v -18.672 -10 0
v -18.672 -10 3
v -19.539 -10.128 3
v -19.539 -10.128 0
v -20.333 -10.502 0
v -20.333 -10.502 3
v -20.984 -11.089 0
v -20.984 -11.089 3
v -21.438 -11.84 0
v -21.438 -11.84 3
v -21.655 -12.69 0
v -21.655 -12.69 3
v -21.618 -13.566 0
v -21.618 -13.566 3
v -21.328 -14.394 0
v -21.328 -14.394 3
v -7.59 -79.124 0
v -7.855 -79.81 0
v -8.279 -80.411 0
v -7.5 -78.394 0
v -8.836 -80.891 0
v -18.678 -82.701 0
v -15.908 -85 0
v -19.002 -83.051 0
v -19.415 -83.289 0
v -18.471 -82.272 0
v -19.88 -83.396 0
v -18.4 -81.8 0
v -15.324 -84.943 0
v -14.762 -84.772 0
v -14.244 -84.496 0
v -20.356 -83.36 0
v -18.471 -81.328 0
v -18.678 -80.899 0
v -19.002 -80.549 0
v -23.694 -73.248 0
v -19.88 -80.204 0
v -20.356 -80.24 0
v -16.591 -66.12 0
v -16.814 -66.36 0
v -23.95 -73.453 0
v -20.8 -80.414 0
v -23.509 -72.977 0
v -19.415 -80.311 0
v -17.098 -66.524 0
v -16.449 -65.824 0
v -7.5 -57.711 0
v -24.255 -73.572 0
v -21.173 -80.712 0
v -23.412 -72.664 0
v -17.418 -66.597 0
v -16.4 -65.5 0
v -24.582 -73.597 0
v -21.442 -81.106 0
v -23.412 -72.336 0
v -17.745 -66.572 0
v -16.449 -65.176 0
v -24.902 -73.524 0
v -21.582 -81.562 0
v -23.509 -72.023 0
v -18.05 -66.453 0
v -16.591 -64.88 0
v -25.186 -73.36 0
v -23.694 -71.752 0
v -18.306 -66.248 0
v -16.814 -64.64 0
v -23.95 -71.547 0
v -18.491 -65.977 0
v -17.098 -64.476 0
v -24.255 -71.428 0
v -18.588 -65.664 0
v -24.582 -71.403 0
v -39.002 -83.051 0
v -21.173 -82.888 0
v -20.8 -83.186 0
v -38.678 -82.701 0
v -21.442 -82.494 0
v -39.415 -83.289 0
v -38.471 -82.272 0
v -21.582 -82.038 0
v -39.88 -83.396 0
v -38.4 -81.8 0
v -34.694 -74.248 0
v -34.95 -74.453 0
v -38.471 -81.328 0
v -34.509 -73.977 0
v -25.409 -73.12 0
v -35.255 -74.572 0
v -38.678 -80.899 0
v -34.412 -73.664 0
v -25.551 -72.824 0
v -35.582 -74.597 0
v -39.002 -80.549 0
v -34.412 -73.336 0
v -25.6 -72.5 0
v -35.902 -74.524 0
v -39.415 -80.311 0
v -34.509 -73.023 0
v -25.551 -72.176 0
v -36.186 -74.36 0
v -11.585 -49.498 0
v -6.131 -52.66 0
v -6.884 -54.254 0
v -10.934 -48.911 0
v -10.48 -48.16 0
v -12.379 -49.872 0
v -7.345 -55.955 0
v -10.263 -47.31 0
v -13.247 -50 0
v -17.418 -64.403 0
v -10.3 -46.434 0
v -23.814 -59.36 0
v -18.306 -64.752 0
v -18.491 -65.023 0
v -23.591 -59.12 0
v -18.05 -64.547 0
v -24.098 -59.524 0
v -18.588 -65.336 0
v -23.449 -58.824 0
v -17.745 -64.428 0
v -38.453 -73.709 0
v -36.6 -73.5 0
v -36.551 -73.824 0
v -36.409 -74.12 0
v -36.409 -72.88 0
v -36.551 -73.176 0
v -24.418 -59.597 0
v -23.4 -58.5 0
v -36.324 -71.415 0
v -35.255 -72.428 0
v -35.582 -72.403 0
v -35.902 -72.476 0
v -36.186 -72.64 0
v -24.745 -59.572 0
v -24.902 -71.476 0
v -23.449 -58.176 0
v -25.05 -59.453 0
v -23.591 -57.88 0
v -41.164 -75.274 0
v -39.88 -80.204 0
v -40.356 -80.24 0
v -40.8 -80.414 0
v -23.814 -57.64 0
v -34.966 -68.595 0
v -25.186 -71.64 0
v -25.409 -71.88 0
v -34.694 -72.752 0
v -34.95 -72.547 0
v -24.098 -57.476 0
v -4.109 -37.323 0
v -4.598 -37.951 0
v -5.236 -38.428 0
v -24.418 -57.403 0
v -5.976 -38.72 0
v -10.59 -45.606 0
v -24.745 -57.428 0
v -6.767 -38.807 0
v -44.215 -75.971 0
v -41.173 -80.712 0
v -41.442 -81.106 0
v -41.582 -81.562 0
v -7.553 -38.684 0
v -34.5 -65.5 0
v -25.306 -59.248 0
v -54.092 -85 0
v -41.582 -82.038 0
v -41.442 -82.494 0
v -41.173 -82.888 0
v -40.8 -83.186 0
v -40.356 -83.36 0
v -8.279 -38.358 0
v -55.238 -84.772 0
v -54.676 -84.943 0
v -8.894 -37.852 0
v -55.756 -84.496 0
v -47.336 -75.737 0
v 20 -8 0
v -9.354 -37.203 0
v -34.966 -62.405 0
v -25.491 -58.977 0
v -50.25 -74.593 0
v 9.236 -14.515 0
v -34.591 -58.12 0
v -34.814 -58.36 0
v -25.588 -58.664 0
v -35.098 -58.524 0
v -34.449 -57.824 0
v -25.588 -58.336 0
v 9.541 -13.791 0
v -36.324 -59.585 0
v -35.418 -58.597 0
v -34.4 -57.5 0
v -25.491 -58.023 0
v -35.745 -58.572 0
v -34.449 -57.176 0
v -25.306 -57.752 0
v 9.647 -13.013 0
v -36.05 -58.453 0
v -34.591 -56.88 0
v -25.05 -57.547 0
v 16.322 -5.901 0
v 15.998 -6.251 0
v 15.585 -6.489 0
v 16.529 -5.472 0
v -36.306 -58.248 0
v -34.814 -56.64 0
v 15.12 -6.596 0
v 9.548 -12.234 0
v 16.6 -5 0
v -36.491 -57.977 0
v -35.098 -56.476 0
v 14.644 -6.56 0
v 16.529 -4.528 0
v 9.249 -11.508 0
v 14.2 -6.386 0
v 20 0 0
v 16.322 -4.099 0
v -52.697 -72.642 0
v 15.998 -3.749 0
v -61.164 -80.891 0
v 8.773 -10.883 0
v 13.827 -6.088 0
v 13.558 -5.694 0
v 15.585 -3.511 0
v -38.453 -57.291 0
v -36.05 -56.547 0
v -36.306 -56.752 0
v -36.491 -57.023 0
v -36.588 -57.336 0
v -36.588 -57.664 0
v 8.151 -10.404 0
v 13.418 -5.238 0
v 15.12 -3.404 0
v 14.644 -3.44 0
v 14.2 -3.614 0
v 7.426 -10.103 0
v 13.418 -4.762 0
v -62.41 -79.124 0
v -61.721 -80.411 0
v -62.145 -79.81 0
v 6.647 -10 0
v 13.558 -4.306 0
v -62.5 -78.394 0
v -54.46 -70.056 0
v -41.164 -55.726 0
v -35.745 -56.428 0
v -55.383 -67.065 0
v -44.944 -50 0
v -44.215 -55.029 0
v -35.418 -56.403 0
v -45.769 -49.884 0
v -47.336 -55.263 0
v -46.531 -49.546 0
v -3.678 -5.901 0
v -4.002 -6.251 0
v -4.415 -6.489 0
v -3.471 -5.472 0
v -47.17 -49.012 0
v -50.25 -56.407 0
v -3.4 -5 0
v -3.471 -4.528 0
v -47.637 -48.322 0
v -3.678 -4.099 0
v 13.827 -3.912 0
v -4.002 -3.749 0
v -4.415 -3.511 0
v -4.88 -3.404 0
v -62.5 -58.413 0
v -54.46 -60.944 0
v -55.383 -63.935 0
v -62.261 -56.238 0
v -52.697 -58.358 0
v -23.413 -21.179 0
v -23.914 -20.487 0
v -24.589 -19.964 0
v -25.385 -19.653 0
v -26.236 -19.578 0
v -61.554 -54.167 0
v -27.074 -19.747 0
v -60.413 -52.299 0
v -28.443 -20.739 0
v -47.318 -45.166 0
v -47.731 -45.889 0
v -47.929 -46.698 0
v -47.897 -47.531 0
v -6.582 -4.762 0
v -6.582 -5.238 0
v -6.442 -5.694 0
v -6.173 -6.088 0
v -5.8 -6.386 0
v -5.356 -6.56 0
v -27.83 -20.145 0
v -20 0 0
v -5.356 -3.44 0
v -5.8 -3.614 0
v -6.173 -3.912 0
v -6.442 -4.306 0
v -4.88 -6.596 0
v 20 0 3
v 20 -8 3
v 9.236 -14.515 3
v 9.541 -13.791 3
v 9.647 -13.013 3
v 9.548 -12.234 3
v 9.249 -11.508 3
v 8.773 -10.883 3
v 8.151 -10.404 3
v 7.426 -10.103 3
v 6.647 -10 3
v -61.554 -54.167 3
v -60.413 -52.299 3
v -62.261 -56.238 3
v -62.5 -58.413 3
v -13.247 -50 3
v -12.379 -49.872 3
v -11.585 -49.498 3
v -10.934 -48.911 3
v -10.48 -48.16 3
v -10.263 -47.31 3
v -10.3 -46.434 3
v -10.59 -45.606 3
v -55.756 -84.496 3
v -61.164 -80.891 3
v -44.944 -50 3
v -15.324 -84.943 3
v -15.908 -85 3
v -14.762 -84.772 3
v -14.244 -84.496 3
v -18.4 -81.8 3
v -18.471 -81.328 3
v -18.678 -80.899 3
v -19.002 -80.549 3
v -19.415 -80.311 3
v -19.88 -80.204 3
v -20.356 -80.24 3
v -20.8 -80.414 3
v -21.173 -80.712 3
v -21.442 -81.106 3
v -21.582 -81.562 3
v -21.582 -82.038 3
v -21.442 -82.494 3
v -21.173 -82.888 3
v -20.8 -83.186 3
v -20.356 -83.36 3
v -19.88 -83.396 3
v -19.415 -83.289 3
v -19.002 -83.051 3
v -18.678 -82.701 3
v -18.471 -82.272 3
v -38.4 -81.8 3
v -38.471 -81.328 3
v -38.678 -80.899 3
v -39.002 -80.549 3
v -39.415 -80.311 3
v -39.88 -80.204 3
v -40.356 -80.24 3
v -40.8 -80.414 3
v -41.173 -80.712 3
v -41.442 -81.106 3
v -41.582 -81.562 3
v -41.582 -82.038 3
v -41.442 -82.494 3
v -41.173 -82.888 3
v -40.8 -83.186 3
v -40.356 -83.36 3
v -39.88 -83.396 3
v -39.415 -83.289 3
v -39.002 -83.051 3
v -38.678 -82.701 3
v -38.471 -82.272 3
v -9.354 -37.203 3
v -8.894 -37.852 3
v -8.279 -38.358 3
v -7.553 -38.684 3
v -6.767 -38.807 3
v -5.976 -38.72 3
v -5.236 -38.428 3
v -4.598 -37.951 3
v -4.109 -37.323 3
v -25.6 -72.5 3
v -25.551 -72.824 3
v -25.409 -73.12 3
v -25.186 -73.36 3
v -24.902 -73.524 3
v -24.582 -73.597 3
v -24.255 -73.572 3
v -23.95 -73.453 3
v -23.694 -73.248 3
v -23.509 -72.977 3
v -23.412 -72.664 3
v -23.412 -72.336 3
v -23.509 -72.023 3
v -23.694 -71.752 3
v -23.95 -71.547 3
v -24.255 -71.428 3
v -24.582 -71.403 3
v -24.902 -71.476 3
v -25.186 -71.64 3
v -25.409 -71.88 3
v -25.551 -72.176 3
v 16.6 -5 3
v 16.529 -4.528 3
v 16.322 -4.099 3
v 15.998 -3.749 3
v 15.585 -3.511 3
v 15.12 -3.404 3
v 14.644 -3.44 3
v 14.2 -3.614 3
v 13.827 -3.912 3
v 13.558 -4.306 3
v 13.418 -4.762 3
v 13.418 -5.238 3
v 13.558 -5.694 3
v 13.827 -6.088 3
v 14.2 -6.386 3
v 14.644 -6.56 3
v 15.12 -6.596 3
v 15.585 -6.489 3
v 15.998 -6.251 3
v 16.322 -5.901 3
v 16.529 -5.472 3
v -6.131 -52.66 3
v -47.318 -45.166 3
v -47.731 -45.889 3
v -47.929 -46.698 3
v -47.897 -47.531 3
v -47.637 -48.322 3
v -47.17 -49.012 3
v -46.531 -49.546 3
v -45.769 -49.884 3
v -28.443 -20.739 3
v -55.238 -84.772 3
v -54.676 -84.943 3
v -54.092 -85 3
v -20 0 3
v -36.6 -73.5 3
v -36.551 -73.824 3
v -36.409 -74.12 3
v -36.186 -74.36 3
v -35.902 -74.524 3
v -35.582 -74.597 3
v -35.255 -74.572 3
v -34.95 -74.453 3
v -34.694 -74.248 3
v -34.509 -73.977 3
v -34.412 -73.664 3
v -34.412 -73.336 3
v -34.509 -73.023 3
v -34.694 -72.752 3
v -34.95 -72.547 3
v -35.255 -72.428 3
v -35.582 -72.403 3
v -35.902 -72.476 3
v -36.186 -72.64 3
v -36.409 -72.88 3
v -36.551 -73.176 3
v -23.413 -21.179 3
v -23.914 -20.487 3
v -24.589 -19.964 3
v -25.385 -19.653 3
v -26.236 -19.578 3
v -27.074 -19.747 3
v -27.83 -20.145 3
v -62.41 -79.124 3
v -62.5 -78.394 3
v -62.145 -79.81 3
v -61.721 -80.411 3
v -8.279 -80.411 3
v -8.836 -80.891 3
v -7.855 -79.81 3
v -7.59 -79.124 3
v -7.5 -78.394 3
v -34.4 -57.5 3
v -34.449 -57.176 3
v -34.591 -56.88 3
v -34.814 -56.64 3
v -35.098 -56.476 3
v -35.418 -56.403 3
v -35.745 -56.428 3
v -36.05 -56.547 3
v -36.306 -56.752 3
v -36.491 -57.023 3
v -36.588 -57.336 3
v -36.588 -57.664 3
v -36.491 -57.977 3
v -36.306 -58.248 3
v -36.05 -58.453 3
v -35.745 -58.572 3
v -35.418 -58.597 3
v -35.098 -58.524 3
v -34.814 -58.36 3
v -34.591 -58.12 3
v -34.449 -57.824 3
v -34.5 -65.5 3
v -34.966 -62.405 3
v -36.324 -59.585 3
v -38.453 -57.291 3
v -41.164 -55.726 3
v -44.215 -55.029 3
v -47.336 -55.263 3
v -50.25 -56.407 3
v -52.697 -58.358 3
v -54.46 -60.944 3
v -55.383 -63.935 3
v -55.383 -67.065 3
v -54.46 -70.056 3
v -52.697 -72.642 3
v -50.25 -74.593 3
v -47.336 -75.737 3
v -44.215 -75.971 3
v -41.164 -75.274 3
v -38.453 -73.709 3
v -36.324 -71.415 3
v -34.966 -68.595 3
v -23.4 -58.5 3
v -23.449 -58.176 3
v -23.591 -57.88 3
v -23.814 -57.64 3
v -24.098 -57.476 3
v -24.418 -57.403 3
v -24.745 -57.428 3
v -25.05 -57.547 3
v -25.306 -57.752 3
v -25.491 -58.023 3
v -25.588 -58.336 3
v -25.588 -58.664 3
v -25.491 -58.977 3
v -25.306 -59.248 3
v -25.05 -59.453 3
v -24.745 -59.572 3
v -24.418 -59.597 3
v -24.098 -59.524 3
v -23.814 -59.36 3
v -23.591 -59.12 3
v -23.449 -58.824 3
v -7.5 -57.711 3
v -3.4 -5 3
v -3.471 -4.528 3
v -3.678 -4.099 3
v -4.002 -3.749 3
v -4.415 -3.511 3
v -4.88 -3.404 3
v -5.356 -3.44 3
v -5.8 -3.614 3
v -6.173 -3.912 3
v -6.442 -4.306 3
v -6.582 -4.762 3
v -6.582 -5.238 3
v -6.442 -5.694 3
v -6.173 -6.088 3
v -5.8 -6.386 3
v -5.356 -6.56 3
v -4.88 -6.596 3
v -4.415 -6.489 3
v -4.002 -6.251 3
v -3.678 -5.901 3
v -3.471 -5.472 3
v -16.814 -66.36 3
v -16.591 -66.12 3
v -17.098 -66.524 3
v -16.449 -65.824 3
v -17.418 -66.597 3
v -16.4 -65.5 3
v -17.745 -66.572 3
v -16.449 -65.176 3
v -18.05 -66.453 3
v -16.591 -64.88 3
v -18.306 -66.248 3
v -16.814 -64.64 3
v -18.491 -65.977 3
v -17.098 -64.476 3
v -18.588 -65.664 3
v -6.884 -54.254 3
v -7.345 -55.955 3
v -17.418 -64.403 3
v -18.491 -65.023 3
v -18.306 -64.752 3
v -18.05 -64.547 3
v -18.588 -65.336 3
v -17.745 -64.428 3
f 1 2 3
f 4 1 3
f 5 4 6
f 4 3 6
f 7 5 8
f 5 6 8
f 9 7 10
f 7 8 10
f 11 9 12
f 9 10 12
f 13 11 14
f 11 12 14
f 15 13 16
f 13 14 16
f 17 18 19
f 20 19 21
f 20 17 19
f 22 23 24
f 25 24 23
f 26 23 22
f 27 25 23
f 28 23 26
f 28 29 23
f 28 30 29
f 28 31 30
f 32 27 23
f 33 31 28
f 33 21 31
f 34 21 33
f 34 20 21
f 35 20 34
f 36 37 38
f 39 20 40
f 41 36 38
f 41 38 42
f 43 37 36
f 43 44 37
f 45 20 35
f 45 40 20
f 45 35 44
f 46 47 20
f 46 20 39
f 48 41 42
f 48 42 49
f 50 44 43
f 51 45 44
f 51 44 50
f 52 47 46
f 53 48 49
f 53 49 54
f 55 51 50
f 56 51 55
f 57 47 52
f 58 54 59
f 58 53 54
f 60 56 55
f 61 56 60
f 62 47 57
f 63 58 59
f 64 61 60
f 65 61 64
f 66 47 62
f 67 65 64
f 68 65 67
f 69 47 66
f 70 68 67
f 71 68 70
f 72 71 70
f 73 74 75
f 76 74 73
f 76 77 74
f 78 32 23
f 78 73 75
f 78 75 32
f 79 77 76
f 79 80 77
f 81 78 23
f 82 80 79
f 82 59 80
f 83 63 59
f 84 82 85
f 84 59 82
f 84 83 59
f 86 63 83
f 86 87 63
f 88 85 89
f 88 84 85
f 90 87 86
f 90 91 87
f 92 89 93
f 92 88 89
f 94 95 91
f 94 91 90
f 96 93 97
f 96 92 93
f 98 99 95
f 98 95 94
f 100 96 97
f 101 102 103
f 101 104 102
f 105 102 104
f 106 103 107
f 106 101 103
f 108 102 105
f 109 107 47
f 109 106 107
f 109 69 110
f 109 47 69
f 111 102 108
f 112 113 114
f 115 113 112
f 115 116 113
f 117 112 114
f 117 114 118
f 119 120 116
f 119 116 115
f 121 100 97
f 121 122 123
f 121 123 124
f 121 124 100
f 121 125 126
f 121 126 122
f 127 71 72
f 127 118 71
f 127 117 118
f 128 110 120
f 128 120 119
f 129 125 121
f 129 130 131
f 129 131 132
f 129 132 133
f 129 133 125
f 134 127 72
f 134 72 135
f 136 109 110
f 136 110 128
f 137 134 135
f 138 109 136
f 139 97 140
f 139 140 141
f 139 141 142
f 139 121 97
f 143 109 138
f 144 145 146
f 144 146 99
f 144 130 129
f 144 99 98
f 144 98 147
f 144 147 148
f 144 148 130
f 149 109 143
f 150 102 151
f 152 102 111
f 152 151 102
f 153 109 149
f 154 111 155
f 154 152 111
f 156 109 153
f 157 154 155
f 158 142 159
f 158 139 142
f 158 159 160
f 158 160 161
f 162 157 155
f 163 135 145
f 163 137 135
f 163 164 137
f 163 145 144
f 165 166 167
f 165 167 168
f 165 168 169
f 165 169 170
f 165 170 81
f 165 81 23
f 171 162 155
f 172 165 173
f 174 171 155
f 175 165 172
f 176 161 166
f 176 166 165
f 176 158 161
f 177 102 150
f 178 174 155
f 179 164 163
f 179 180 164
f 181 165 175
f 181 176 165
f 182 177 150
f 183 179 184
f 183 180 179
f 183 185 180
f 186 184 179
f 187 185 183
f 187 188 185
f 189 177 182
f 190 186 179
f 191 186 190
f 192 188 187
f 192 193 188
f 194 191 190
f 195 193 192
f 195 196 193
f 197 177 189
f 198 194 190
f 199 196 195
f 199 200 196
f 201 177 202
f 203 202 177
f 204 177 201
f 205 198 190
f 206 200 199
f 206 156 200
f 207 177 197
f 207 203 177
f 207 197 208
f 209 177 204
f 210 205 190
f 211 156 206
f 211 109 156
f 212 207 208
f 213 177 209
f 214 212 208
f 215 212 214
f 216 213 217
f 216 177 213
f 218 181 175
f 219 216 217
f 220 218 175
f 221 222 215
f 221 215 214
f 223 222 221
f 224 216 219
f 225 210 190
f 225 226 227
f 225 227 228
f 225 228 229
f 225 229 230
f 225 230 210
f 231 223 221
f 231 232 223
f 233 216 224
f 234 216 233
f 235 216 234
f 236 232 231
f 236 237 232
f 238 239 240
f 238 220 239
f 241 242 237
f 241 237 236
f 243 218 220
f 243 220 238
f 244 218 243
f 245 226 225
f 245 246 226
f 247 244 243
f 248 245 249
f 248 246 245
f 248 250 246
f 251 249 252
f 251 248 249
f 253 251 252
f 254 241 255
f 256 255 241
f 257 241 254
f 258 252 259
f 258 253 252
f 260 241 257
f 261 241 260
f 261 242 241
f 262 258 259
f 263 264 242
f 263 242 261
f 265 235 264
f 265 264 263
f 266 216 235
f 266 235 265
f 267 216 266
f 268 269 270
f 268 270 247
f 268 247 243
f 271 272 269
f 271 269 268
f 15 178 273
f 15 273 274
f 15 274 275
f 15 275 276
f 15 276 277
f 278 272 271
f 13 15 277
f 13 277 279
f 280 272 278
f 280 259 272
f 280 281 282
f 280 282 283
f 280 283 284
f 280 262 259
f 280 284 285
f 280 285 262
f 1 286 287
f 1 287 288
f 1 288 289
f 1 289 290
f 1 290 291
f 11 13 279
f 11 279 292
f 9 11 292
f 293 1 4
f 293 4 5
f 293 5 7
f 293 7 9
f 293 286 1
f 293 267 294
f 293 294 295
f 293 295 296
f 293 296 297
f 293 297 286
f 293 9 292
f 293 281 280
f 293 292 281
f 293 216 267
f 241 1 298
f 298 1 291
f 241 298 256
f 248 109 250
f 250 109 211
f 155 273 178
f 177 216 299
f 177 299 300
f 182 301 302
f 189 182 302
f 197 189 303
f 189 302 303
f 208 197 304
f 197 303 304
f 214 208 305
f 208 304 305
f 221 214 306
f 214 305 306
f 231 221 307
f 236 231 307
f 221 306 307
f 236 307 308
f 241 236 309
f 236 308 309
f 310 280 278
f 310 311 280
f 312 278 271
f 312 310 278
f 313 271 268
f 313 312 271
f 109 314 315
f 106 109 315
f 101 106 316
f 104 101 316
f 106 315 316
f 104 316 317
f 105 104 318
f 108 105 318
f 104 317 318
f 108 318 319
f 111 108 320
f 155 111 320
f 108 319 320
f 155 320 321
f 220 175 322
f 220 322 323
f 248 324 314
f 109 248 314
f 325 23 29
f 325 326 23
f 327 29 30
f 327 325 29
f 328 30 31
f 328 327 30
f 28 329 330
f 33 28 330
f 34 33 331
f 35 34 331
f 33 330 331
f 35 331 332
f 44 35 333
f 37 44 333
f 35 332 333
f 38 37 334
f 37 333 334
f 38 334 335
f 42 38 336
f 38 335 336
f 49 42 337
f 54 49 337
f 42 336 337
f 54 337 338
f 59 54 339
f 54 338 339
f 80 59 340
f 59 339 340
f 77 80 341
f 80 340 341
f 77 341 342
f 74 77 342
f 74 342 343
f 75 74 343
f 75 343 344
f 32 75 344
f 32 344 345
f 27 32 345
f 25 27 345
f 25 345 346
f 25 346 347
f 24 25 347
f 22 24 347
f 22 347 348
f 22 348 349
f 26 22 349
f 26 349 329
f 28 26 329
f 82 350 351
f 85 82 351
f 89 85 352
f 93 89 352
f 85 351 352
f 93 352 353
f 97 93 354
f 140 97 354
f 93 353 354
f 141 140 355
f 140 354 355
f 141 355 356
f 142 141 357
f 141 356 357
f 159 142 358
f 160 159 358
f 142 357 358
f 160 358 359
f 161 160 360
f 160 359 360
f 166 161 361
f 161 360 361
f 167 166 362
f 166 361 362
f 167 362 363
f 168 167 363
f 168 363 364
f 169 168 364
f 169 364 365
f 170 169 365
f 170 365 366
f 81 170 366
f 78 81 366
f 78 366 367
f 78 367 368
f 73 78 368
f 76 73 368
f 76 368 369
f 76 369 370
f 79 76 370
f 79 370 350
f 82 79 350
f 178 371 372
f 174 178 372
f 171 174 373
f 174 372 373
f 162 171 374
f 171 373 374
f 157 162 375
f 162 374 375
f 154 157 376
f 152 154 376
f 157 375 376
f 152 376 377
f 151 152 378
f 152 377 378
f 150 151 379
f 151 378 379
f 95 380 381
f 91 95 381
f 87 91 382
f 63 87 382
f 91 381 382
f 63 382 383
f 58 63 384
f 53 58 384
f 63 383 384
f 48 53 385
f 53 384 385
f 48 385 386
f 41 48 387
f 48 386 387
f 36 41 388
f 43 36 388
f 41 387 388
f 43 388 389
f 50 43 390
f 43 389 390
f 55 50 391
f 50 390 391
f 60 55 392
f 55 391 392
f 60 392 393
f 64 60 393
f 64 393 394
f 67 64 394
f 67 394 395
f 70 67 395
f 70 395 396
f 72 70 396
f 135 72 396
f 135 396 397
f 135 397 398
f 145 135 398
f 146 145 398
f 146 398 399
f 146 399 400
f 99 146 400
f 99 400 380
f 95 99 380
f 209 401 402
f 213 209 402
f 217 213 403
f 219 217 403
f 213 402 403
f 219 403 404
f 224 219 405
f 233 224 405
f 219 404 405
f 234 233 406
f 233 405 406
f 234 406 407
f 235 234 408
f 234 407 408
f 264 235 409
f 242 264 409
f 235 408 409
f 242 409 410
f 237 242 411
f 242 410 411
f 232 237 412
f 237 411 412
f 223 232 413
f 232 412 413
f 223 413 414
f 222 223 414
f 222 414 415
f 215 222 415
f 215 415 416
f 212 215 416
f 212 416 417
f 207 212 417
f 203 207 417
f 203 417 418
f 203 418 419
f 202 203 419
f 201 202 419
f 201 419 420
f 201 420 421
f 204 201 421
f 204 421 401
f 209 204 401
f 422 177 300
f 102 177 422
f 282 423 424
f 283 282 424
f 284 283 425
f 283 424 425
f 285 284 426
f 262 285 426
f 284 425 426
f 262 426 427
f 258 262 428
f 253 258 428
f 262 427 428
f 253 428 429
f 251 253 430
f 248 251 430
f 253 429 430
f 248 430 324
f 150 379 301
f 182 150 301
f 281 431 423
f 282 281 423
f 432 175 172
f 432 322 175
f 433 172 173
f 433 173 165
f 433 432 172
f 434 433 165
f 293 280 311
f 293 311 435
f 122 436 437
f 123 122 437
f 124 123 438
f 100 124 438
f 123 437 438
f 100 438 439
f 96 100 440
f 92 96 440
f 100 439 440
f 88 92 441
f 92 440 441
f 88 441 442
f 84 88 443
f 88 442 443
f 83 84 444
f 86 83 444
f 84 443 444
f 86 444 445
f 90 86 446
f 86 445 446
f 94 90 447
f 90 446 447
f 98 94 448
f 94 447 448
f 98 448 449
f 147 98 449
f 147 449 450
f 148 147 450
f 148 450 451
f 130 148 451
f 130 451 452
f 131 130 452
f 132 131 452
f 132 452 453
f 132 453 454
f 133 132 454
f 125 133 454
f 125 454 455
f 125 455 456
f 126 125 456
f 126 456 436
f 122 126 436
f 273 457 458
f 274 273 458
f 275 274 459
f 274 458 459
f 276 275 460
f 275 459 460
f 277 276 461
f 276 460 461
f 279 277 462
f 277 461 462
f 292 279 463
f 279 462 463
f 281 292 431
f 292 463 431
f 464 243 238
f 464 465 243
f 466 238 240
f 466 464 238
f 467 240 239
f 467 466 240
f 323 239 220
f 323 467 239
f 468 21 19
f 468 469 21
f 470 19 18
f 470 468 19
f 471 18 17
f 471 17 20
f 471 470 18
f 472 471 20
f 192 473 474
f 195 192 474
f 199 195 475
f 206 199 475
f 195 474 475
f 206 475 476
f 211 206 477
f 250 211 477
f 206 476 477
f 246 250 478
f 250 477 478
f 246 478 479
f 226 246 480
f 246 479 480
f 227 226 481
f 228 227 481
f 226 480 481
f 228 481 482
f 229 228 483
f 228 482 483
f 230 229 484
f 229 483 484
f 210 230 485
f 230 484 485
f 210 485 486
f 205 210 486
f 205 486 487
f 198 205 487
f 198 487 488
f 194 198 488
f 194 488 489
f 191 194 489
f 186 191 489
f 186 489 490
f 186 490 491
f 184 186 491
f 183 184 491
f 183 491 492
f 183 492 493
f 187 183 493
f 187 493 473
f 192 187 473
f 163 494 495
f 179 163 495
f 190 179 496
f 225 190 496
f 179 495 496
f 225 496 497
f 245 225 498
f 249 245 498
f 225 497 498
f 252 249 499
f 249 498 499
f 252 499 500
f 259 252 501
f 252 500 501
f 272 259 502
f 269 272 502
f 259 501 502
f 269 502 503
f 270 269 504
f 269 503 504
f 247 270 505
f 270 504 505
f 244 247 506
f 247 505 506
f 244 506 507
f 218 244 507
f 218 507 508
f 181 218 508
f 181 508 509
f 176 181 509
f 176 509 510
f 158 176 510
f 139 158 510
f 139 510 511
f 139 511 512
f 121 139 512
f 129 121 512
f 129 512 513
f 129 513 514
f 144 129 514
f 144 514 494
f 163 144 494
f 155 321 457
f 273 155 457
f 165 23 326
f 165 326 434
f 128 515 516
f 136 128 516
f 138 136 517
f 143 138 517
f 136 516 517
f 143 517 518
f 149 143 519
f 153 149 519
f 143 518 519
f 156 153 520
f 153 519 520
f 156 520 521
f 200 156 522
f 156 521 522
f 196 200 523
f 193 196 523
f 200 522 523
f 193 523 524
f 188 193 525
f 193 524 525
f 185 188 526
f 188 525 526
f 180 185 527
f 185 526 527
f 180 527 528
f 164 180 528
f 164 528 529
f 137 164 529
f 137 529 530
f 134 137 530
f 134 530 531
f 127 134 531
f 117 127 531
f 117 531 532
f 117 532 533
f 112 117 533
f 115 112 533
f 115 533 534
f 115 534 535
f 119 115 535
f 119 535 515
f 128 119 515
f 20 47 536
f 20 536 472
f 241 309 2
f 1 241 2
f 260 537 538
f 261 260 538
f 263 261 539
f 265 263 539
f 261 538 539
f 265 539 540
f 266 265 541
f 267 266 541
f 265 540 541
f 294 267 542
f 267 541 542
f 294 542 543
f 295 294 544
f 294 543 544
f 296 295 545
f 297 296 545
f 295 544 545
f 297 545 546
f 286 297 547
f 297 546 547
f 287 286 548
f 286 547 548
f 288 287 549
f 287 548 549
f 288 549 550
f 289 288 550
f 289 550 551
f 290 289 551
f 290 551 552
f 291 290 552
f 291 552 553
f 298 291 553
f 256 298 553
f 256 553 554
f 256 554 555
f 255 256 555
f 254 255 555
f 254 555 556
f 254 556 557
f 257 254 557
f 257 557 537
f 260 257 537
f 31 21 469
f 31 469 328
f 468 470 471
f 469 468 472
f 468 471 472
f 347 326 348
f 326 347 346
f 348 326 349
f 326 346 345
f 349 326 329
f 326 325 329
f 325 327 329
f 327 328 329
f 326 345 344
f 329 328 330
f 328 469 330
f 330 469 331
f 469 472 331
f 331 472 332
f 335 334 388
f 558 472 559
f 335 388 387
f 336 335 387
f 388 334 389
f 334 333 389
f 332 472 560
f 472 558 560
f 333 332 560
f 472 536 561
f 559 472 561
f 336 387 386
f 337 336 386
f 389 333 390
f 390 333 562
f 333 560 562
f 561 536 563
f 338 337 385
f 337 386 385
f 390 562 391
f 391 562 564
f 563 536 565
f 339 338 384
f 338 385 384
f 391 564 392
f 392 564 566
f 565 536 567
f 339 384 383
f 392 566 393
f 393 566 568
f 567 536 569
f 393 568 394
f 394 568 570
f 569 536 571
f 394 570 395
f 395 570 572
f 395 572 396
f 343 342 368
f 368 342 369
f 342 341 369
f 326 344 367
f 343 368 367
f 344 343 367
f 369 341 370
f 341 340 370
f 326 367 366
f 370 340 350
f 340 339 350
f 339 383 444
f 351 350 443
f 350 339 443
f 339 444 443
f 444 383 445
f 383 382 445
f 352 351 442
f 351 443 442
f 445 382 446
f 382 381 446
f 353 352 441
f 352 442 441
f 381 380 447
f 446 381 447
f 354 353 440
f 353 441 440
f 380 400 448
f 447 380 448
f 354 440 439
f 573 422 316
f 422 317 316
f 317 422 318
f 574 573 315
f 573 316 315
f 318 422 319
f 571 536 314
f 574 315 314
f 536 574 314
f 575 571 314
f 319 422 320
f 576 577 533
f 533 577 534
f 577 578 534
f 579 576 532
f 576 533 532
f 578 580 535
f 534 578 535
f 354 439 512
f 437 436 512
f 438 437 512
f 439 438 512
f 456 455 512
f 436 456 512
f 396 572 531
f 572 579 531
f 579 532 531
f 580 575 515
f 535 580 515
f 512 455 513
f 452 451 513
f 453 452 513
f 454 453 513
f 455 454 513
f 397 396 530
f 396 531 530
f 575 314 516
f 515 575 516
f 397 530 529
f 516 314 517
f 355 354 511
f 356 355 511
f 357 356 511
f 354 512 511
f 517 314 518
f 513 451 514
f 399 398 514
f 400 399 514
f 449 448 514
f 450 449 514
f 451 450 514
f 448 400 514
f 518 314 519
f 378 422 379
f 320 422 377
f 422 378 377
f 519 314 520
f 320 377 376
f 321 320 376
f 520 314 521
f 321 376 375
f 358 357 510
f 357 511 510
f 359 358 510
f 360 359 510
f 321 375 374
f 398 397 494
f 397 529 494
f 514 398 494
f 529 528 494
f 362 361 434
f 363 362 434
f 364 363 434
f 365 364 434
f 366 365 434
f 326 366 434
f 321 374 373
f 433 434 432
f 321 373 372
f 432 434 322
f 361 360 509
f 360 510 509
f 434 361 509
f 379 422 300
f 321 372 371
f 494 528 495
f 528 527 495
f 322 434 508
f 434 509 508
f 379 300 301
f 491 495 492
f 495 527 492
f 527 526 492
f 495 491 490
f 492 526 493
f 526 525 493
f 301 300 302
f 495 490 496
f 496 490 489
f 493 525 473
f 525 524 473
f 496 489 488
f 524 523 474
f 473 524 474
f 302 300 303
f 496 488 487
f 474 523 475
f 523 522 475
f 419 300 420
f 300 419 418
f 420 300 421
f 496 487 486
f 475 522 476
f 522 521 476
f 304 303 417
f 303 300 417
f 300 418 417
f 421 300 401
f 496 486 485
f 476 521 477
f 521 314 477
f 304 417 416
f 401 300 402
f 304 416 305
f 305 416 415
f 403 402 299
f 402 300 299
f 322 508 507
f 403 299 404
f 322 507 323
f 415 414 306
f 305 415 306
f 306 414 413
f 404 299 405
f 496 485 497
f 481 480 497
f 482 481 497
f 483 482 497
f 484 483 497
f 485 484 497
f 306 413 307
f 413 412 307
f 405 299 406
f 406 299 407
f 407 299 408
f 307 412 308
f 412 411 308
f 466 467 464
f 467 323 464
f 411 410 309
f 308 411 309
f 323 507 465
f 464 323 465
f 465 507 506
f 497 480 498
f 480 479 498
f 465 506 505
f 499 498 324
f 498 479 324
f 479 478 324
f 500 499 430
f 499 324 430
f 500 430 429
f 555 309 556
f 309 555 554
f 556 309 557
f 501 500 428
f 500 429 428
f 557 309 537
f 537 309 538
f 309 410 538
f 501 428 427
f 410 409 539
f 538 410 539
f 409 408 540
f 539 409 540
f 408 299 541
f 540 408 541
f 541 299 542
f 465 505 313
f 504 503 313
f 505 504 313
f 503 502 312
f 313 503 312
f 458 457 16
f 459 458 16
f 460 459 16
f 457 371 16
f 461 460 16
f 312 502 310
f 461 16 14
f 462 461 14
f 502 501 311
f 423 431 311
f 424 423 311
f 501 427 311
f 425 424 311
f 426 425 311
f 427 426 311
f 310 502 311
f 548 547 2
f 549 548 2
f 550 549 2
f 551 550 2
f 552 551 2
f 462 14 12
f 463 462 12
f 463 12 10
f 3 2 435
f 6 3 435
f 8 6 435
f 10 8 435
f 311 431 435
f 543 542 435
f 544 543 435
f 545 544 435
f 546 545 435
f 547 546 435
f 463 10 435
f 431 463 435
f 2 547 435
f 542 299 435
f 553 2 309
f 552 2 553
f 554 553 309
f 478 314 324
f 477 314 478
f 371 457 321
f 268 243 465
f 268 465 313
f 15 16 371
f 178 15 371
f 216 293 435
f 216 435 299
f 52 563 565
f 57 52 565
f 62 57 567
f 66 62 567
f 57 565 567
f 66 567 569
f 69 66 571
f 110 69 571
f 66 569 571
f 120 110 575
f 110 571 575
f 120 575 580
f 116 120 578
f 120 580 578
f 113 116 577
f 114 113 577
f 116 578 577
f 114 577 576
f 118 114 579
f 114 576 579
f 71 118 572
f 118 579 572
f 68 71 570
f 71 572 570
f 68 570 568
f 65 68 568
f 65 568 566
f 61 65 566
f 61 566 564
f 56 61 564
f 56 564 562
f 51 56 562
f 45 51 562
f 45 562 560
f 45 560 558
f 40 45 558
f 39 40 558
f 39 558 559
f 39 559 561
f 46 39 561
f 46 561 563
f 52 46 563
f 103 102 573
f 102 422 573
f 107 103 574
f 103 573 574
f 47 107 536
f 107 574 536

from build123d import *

# Parameters (mm, degrees)
EXTRUDE_3_DEPTH     = 3
SKETCH_6_R          = 1.6
SKETCH_6_R_2        = 1.1
SKETCH_6_R_3        = 10.5
CUT_EXTRUDE_1_DEPTH = 106.547382725
CUT_EXTRUDE_2_DEPTH = 10
FILLET_1_R          = 10
FILLET_2_R          = 3


with BuildPart() as part:
    # 草图5 → 凸台-拉伸3 (new body)
    with BuildSketch(Plane.XY):
        Polygon((-20, 0), (20, 0), (20, -8), (-7.5, -55), (-7.5, -80), (-15, -85), (-55, -85), (-62.5, -80), (-62.5, -55), align=None)
    extrude(amount=EXTRUDE_3_DEPTH)

    # 草图6 → 切除-拉伸1 (cut, through all)
    with BuildSketch(Plane.XY.offset(3)):
        with Locations((-5, -5)):
            Circle(SKETCH_6_R)
        with Locations((15, -5)):
            Circle(SKETCH_6_R)
        with Locations((-40, -81.8)):
            Circle(SKETCH_6_R)
        with Locations((-20, -81.8)):
            Circle(SKETCH_6_R)
        with Locations((-17.5, -65.5)):
            Circle(SKETCH_6_R_2)
        with Locations((-24.5, -58.5)):
            Circle(SKETCH_6_R_2)
        with Locations((-35.5, -57.5)):
            Circle(SKETCH_6_R_2)
        with Locations(Location((-35.5, -73.5, 0), (0, 0, 180))):
            Circle(SKETCH_6_R_2)
        with Locations(Location((-24.5, -72.5, 0), (0, 0, 180))):
            Circle(SKETCH_6_R_2)
        with Locations((-45, -65.5)):
            Circle(SKETCH_6_R_3)
    extrude(amount=-CUT_EXTRUDE_1_DEPTH, mode=Mode.SUBTRACT)

    # 草图7 → 切除-拉伸2 (cut)
    with BuildSketch(Plane.XY.offset(3)):
        with BuildLine():
            Line((-28.443219333, -20.739299448), (-47.318132371, -45.165657497))
            ThreePointArc((-47.318132371, -45.165657497), (-47.637140852, -48.322303386), (-44.944277366, -50))
            Line((-44.944277366, -50), (-13.246531534, -50))
            ThreePointArc((-13.246531534, -50), (-10.67911571, -48.551894323), (-10.590292839, -45.605583994))
            Line((-10.590292839, -45.605583994), (-23.413125634, -21.179225945))
            ThreePointArc((-23.413125634, -21.179225945), (-25.807985355, -19.585050137), (-28.443219333, -20.739299448))
        make_face()
        with BuildLine():
            Line((-4.108825767, -37.323278412), (9.236421762, -14.515037181))
            ThreePointArc((9.236421762, -14.515037181), (9.249498939, -11.507537529), (6.647085488, -10))
            Line((6.647085488, -10), (-18.671550094, -10))
            ThreePointArc((-18.671550094, -10), (-21.238965917, -11.448105677), (-21.327788788, -14.394416006))
            Line((-21.327788788, -14.394416006), (-9.354400735, -37.202657237))
            ThreePointArc((-9.354400735, -37.202657237), (-6.76712834, -38.8074484), (-4.108825767, -37.323278412))
        make_face()
    extrude(amount=-CUT_EXTRUDE_2_DEPTH, mode=Mode.SUBTRACT)

    # 圆角1
    fillet_1_edges = [part.edges().sort_by_distance(p)[0] for p in [
        (-62.5, -55, 1.5),
        (-7.5, -55, 1.5),
    ]]
    fillet(fillet_1_edges, radius=FILLET_1_R)

    # 圆角2
    fillet_2_edges = [part.edges().sort_by_distance(p)[0] for p in [
        (-62.5, -80, 1.5),
        (-7.5, -80, 1.5),
        (-15, -85, 1.5),
        (-55, -85, 1.5),
    ]]
    fillet(fillet_2_edges, radius=FILLET_2_R)


solid = part.part
